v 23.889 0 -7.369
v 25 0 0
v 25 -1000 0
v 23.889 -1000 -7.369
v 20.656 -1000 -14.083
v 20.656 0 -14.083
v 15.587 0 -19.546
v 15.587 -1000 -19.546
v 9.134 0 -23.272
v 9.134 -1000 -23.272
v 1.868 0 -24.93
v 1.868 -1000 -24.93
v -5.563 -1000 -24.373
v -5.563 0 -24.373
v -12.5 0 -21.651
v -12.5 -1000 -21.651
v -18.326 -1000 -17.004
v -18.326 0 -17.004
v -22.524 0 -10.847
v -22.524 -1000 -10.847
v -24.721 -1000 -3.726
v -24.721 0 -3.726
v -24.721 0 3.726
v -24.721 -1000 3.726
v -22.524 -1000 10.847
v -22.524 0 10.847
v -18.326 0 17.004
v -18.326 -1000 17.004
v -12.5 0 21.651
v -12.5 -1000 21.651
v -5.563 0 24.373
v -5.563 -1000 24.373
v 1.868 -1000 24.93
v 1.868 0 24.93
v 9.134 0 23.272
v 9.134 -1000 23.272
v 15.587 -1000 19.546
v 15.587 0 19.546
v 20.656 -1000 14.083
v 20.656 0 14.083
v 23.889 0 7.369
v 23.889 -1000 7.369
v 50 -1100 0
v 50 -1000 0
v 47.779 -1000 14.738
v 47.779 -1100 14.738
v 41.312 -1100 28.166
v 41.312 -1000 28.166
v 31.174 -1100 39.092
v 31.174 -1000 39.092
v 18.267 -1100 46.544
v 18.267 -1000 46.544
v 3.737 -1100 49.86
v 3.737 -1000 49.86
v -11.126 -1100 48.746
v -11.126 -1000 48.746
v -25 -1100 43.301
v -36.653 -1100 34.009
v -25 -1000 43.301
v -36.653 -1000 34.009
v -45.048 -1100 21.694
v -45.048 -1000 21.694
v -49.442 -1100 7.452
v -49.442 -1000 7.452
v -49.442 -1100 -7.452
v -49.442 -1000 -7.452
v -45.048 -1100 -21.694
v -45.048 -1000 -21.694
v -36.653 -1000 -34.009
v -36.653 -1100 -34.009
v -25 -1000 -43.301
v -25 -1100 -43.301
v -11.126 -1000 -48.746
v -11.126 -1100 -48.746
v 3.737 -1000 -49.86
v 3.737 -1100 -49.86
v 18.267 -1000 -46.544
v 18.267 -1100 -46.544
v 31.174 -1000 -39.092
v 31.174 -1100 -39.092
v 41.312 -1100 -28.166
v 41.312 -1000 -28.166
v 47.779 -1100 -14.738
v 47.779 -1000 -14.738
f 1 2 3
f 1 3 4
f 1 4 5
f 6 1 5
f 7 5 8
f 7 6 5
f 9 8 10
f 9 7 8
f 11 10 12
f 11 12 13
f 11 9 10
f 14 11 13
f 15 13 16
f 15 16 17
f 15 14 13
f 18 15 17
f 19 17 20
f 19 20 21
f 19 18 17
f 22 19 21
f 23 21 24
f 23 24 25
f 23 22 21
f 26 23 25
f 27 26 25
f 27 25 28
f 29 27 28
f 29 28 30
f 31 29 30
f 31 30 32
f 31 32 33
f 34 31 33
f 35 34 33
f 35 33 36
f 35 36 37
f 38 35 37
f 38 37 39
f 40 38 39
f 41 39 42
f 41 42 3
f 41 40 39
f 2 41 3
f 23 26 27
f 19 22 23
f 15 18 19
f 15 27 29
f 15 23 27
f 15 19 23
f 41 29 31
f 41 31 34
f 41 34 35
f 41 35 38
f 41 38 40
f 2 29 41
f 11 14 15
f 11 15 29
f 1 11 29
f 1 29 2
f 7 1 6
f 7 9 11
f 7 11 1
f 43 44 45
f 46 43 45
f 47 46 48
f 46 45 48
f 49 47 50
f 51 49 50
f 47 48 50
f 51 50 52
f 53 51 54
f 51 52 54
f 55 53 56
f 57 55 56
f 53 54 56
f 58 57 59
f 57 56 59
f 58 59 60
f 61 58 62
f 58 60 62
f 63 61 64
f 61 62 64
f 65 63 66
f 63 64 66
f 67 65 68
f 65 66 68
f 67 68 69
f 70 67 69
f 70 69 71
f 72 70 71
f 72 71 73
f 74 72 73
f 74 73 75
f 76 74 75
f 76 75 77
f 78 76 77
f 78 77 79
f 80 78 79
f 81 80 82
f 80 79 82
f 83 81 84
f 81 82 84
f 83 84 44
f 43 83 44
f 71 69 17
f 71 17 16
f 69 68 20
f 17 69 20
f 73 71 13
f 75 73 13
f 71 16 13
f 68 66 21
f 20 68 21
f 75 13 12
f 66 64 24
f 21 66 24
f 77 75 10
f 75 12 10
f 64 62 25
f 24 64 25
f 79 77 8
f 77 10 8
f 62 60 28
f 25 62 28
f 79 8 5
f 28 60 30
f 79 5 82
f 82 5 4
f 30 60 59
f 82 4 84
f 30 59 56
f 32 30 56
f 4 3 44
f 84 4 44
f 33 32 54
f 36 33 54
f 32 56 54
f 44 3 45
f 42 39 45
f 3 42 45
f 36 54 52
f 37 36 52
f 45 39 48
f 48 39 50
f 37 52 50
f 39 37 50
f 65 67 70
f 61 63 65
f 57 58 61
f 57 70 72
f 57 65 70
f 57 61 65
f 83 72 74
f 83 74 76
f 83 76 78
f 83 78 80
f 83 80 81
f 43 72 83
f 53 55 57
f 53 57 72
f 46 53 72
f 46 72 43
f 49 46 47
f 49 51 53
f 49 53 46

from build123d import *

# Parameters (mm, degrees)
SKETCH1_R           = 0.25
BOSS_EXTRUDE1_DEPTH = 10
SKETCH2_R           = 0.5
BOSS_EXTRUDE2_DEPTH = 1
SCALE1_SCALE        = 100


with BuildPart() as part:
    # Sketch1 → Boss-Extrude1 (new body)
    with BuildSketch(Plane(origin=(0, 0, 0), x_dir=(1, 0, 0), z_dir=(0, 1, 0))):
        Circle(SKETCH1_R)
    extrude(amount=-BOSS_EXTRUDE1_DEPTH)

    # Sketch2 → Boss-Extrude2 (add)
    with BuildSketch(Plane.XZ.offset(10)):
        Circle(SKETCH2_R)
    extrude(amount=BOSS_EXTRUDE2_DEPTH)


with BuildPart() as part_1:
    # Scale1: scaled about (0, 0, 0)
    add(part.part.scale(SCALE1_SCALE))


solid = part_1.part
